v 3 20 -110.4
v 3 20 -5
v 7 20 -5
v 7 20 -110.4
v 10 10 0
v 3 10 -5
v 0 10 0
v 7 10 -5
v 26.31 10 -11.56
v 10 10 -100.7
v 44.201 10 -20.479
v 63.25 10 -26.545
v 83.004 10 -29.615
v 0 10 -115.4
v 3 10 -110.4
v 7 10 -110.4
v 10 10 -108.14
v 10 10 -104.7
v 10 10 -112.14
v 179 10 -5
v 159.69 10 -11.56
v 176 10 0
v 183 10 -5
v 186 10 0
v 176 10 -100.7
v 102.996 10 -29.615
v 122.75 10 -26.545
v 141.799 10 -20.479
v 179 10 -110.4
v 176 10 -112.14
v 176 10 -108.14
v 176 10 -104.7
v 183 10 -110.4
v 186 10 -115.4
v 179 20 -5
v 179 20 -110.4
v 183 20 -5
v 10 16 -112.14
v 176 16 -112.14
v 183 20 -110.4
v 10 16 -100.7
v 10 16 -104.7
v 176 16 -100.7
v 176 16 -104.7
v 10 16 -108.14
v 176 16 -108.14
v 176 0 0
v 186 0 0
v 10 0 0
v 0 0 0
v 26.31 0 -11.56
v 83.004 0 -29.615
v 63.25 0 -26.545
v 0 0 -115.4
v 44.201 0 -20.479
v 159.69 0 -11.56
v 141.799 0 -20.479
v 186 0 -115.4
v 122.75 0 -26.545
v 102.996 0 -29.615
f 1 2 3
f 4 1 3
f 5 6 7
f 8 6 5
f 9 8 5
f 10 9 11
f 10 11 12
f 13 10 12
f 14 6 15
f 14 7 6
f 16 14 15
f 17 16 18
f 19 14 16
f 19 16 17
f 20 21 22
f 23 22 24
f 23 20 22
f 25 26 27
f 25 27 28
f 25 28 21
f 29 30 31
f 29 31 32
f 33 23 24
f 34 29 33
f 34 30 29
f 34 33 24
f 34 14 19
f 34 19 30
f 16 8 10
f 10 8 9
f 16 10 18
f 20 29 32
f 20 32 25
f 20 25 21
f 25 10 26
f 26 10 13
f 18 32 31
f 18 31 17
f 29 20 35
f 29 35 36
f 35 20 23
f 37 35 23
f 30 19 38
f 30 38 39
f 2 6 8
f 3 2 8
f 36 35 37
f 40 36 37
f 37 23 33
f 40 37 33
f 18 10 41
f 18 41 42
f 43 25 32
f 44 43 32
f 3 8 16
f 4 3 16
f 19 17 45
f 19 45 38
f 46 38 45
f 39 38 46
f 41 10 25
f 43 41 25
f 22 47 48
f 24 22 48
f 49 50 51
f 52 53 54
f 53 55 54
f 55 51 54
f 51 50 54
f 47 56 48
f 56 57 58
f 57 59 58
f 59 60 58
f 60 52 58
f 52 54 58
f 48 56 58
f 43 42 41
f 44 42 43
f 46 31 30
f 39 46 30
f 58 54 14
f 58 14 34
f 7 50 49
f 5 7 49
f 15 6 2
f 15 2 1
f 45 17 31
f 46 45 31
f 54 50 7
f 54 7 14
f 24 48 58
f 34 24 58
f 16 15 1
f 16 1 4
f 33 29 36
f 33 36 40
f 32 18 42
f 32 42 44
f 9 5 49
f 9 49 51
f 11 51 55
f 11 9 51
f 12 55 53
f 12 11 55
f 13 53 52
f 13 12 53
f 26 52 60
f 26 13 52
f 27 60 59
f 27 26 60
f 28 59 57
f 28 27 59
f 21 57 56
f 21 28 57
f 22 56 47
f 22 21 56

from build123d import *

# Parameters (mm, degrees)
SKETCH1_W           = 186
SKETCH1_H           = 115.4
BOSS_EXTRUDE1_DEPTH = 10
CUT_EXTRUDE5_DEPTH  = 220.119054397
SKETCH4_W           = 166
SKETCH4_H           = 4
BOSS_EXTRUDE3_DEPTH = 6
SKETCH6_W           = 4
SKETCH6_H           = 105.4
BOSS_EXTRUDE4_DEPTH = 10
SKETCH7_W           = 4
SKETCH7_H           = 105.4
BOSS_EXTRUDE5_DEPTH = 10


with BuildPart() as part:
    # Sketch1 → Boss-Extrude1 (new body)
    with BuildSketch(Plane(origin=(0, 0, 0), x_dir=(1, 0, 0), z_dir=(0, 1, 0))):
        with Locations((93, 57.7)):
            Rectangle(SKETCH1_W, SKETCH1_H)
    extrude(amount=BOSS_EXTRUDE1_DEPTH)

    # Sketch5 → Cut-Extrude5 (cut, through all)
    with BuildSketch(Plane(origin=(0, 10, 0), x_dir=(1, 0, 0), z_dir=(0, 1, 0))):
        with BuildLine():
            Line((176, 0), (10, 0))
            ThreePointArc((10, 0), (93, 30), (176, 0))
        make_face()
    extrude(amount=-CUT_EXTRUDE5_DEPTH, mode=Mode.SUBTRACT)

    # Sketch4 → Boss-Extrude3 (add)
    with BuildSketch(Plane(origin=(0, 10, 0), x_dir=(1, 0, 0), z_dir=(0, 1, 0))):
        with Locations((93, 102.7)):
            Rectangle(SKETCH4_W, SKETCH4_H)
        with Locations((93, 110.14)):
            Rectangle(SKETCH4_W, SKETCH4_H)
    extrude(amount=BOSS_EXTRUDE3_DEPTH)

    # Sketch6 → Boss-Extrude4 (add)
    with BuildSketch(Plane(origin=(0, 10, 0), x_dir=(1, 0, 0), z_dir=(0, 1, 0))):
        with Locations((181, 57.7)):
            Rectangle(SKETCH6_W, SKETCH6_H)
    extrude(amount=BOSS_EXTRUDE4_DEPTH)

    # Sketch7 → Boss-Extrude5 (add)
    with BuildSketch(Plane(origin=(0, 10, 0), x_dir=(1, 0, 0), z_dir=(0, 1, 0))):
        with Locations((5, 57.7)):
            Rectangle(SKETCH7_W, SKETCH7_H)
    extrude(amount=BOSS_EXTRUDE5_DEPTH)


solid = part.part
